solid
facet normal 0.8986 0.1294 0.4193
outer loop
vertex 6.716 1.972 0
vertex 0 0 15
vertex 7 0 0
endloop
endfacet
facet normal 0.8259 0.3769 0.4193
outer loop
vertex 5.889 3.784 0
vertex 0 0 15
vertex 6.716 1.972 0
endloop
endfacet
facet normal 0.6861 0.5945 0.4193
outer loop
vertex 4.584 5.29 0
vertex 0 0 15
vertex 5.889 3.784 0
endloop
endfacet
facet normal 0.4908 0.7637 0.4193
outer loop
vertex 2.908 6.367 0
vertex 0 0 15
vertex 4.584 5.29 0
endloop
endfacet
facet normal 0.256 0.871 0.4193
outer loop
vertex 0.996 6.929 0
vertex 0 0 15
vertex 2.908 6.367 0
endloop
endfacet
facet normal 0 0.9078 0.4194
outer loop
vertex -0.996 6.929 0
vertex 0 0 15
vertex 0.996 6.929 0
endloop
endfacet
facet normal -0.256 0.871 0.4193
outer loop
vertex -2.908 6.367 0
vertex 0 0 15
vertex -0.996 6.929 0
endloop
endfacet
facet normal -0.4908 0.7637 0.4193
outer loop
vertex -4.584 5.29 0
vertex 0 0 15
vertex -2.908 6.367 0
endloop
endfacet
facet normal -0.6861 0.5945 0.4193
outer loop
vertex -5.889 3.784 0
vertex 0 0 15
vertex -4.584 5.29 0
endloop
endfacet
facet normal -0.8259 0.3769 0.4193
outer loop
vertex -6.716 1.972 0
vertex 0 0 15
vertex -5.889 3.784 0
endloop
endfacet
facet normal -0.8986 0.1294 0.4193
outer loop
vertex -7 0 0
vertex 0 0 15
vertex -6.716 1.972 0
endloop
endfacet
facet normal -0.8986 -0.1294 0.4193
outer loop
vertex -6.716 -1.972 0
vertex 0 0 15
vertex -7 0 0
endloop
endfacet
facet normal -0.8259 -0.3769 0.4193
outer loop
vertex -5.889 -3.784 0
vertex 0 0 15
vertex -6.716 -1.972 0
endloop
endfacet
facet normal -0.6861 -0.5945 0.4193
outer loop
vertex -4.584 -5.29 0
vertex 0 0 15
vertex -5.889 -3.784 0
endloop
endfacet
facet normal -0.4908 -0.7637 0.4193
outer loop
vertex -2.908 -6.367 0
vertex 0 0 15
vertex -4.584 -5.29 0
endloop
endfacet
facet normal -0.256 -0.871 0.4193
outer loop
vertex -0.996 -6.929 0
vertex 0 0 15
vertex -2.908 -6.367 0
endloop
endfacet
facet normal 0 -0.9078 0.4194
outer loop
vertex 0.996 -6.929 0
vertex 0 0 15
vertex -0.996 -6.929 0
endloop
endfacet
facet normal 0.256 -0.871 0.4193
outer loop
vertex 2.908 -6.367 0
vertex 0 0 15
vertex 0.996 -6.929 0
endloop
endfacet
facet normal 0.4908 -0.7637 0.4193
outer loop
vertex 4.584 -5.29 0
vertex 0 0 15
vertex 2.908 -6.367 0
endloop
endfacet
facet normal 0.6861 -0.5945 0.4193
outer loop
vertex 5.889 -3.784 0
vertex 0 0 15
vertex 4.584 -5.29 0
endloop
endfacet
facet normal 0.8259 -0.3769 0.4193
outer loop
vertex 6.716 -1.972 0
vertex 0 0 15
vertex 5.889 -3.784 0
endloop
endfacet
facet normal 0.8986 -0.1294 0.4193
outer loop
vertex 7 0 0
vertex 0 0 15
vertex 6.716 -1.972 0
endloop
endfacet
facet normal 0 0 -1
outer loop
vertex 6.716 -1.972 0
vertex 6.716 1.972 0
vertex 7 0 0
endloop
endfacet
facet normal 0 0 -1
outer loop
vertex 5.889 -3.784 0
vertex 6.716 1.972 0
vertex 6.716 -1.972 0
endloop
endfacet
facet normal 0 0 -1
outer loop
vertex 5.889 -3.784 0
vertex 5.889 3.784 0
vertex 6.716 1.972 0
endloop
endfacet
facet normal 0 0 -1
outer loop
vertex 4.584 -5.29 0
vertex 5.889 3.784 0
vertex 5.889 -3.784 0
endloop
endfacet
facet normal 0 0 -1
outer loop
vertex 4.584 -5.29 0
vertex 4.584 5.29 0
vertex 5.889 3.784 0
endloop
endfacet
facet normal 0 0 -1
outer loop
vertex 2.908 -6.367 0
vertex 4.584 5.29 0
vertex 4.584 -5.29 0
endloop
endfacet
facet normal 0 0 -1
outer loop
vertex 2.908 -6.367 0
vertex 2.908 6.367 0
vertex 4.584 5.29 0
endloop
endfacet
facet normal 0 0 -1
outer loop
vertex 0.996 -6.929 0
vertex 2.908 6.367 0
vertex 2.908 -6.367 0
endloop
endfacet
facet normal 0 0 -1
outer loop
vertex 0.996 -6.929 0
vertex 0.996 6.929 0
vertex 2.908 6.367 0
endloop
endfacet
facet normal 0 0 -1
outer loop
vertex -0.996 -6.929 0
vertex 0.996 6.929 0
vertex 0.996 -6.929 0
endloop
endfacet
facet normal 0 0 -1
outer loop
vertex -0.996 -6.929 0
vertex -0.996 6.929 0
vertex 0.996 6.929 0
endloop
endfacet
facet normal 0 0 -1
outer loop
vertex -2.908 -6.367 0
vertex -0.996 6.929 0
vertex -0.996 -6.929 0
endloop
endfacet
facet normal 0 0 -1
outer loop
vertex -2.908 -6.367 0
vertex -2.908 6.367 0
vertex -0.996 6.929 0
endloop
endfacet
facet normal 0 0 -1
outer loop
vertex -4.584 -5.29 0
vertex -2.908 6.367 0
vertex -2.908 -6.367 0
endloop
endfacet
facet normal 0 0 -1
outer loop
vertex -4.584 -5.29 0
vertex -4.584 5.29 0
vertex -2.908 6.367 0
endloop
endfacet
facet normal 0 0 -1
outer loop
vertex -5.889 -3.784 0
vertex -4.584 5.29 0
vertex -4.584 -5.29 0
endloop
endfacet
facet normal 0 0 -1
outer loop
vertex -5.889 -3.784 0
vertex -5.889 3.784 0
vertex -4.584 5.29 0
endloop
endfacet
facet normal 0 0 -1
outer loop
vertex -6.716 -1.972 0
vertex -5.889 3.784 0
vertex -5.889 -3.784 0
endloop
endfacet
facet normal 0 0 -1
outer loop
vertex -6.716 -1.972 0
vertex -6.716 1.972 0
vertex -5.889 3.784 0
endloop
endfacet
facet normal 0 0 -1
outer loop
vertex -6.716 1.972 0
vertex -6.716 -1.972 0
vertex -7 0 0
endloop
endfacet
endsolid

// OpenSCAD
// Generated by SolidPython 1.0.1 on 2020-07-29 00:46:43


cylinder(h = 15, r1 = 7, r2 = 0);
/***********************************************
*********      SolidPython code:      **********
************************************************
 
# import packages: SolidPython
from solid import *
from solid.utils import *
from itertools import chain, combinations, permutations


class Resize:

    def __init__(self, scad_file):
        self.scad_file = scad_file
        #self.scad_file = import_scad(scad_file)
        # cone/cylinder param:
        self.r1 = 0
        self.r2 = 0
        self.h = 0
        # rectangular prism param:
        self.w = 0
        self.l = 0
        # ellipse param:
        self.r = 0

    # import OpenScad code (file name corresponds to shape)


    # classify shape + parameters
    def assign(self, param1, param2, param3):
        if self.scad_file == 'cone.scad':
            self.r1 = param1
            self.r2 = param2
            self.h = param3
        elif self.scad_file == 'cylinder.scad':
            self.r1 = param1
            self.r2 = param2
            self.h = param3
        elif self.scad_file == 'rectangularPrism.scad':
            self.h = param1
            self.l = param2
            self.w = param3
        else:
            self.r = param1
            self.h = param2

    # resize parameters
    def iterate(self):
        x = range(3, 20, 2)
        i = 1
        if self.scad_file == 'cone.scad':
            tempList = list(permutations(x, 2))
            for temp in tempList:
                param1 = temp[0]
                param2 = temp[1]
                filepath = 'produced_scad_files/' + 'cone' + str(param1) + '_' + str(param2) + '_' + '.scad'
                scad_render_to_file(cylinder(h=param1, r1=param2, r2=0), filepath)

        elif self.scad_file == 'cylinder.scad':
            tempList = list(permutations(x, 3))
            for temp in tempList:
                param1 = temp[0]
                param2 = temp[1]
                filepath = 'produced_scad_files/' + 'cylinder' + str(param1) + '_' + str(param2) + '_' + '.scad'
                scad_render_to_file(cylinder(h=param1, r1=param2, r2=param2), filepath)

        elif self.scad_file == 'rectangularPrism.scad':
            tempList = list(permutations(x, 3))
            for temp in tempList:
                param1 = temp[0]
                param2 = temp[1]
                param3 = temp[2]
                filepath = 'produced_scad_files/' + 'rectangularPrism' + str(param1) + '_' + str(param2) + '_' + str(
                    param3) + '.scad'
                scad_render_to_file(cube(size=(param1, param2, param3)), filepath)

        elif self.scad_file == 'ellipse.scad':
            tempList = list(permutations(x, 4))
            for temp in tempList:
                param1 = temp[0]
                param2 = temp[1]
                param3 = temp[2]
                param4 = temp[3]
                filepath = 'produced_scad_files/' + 'ellipse' + str(param1) + '_' + str(param2) + '_' + str(param3) + '_' + str(param4) + '.scad'
                scad_render_to_file(scale([param1, param2, param3])(sphere(r=param4)), filepath)

    def render_to_scadfile(self):
        scad_render_to_file(scad, 'example.scad') 
 
************************************************/
